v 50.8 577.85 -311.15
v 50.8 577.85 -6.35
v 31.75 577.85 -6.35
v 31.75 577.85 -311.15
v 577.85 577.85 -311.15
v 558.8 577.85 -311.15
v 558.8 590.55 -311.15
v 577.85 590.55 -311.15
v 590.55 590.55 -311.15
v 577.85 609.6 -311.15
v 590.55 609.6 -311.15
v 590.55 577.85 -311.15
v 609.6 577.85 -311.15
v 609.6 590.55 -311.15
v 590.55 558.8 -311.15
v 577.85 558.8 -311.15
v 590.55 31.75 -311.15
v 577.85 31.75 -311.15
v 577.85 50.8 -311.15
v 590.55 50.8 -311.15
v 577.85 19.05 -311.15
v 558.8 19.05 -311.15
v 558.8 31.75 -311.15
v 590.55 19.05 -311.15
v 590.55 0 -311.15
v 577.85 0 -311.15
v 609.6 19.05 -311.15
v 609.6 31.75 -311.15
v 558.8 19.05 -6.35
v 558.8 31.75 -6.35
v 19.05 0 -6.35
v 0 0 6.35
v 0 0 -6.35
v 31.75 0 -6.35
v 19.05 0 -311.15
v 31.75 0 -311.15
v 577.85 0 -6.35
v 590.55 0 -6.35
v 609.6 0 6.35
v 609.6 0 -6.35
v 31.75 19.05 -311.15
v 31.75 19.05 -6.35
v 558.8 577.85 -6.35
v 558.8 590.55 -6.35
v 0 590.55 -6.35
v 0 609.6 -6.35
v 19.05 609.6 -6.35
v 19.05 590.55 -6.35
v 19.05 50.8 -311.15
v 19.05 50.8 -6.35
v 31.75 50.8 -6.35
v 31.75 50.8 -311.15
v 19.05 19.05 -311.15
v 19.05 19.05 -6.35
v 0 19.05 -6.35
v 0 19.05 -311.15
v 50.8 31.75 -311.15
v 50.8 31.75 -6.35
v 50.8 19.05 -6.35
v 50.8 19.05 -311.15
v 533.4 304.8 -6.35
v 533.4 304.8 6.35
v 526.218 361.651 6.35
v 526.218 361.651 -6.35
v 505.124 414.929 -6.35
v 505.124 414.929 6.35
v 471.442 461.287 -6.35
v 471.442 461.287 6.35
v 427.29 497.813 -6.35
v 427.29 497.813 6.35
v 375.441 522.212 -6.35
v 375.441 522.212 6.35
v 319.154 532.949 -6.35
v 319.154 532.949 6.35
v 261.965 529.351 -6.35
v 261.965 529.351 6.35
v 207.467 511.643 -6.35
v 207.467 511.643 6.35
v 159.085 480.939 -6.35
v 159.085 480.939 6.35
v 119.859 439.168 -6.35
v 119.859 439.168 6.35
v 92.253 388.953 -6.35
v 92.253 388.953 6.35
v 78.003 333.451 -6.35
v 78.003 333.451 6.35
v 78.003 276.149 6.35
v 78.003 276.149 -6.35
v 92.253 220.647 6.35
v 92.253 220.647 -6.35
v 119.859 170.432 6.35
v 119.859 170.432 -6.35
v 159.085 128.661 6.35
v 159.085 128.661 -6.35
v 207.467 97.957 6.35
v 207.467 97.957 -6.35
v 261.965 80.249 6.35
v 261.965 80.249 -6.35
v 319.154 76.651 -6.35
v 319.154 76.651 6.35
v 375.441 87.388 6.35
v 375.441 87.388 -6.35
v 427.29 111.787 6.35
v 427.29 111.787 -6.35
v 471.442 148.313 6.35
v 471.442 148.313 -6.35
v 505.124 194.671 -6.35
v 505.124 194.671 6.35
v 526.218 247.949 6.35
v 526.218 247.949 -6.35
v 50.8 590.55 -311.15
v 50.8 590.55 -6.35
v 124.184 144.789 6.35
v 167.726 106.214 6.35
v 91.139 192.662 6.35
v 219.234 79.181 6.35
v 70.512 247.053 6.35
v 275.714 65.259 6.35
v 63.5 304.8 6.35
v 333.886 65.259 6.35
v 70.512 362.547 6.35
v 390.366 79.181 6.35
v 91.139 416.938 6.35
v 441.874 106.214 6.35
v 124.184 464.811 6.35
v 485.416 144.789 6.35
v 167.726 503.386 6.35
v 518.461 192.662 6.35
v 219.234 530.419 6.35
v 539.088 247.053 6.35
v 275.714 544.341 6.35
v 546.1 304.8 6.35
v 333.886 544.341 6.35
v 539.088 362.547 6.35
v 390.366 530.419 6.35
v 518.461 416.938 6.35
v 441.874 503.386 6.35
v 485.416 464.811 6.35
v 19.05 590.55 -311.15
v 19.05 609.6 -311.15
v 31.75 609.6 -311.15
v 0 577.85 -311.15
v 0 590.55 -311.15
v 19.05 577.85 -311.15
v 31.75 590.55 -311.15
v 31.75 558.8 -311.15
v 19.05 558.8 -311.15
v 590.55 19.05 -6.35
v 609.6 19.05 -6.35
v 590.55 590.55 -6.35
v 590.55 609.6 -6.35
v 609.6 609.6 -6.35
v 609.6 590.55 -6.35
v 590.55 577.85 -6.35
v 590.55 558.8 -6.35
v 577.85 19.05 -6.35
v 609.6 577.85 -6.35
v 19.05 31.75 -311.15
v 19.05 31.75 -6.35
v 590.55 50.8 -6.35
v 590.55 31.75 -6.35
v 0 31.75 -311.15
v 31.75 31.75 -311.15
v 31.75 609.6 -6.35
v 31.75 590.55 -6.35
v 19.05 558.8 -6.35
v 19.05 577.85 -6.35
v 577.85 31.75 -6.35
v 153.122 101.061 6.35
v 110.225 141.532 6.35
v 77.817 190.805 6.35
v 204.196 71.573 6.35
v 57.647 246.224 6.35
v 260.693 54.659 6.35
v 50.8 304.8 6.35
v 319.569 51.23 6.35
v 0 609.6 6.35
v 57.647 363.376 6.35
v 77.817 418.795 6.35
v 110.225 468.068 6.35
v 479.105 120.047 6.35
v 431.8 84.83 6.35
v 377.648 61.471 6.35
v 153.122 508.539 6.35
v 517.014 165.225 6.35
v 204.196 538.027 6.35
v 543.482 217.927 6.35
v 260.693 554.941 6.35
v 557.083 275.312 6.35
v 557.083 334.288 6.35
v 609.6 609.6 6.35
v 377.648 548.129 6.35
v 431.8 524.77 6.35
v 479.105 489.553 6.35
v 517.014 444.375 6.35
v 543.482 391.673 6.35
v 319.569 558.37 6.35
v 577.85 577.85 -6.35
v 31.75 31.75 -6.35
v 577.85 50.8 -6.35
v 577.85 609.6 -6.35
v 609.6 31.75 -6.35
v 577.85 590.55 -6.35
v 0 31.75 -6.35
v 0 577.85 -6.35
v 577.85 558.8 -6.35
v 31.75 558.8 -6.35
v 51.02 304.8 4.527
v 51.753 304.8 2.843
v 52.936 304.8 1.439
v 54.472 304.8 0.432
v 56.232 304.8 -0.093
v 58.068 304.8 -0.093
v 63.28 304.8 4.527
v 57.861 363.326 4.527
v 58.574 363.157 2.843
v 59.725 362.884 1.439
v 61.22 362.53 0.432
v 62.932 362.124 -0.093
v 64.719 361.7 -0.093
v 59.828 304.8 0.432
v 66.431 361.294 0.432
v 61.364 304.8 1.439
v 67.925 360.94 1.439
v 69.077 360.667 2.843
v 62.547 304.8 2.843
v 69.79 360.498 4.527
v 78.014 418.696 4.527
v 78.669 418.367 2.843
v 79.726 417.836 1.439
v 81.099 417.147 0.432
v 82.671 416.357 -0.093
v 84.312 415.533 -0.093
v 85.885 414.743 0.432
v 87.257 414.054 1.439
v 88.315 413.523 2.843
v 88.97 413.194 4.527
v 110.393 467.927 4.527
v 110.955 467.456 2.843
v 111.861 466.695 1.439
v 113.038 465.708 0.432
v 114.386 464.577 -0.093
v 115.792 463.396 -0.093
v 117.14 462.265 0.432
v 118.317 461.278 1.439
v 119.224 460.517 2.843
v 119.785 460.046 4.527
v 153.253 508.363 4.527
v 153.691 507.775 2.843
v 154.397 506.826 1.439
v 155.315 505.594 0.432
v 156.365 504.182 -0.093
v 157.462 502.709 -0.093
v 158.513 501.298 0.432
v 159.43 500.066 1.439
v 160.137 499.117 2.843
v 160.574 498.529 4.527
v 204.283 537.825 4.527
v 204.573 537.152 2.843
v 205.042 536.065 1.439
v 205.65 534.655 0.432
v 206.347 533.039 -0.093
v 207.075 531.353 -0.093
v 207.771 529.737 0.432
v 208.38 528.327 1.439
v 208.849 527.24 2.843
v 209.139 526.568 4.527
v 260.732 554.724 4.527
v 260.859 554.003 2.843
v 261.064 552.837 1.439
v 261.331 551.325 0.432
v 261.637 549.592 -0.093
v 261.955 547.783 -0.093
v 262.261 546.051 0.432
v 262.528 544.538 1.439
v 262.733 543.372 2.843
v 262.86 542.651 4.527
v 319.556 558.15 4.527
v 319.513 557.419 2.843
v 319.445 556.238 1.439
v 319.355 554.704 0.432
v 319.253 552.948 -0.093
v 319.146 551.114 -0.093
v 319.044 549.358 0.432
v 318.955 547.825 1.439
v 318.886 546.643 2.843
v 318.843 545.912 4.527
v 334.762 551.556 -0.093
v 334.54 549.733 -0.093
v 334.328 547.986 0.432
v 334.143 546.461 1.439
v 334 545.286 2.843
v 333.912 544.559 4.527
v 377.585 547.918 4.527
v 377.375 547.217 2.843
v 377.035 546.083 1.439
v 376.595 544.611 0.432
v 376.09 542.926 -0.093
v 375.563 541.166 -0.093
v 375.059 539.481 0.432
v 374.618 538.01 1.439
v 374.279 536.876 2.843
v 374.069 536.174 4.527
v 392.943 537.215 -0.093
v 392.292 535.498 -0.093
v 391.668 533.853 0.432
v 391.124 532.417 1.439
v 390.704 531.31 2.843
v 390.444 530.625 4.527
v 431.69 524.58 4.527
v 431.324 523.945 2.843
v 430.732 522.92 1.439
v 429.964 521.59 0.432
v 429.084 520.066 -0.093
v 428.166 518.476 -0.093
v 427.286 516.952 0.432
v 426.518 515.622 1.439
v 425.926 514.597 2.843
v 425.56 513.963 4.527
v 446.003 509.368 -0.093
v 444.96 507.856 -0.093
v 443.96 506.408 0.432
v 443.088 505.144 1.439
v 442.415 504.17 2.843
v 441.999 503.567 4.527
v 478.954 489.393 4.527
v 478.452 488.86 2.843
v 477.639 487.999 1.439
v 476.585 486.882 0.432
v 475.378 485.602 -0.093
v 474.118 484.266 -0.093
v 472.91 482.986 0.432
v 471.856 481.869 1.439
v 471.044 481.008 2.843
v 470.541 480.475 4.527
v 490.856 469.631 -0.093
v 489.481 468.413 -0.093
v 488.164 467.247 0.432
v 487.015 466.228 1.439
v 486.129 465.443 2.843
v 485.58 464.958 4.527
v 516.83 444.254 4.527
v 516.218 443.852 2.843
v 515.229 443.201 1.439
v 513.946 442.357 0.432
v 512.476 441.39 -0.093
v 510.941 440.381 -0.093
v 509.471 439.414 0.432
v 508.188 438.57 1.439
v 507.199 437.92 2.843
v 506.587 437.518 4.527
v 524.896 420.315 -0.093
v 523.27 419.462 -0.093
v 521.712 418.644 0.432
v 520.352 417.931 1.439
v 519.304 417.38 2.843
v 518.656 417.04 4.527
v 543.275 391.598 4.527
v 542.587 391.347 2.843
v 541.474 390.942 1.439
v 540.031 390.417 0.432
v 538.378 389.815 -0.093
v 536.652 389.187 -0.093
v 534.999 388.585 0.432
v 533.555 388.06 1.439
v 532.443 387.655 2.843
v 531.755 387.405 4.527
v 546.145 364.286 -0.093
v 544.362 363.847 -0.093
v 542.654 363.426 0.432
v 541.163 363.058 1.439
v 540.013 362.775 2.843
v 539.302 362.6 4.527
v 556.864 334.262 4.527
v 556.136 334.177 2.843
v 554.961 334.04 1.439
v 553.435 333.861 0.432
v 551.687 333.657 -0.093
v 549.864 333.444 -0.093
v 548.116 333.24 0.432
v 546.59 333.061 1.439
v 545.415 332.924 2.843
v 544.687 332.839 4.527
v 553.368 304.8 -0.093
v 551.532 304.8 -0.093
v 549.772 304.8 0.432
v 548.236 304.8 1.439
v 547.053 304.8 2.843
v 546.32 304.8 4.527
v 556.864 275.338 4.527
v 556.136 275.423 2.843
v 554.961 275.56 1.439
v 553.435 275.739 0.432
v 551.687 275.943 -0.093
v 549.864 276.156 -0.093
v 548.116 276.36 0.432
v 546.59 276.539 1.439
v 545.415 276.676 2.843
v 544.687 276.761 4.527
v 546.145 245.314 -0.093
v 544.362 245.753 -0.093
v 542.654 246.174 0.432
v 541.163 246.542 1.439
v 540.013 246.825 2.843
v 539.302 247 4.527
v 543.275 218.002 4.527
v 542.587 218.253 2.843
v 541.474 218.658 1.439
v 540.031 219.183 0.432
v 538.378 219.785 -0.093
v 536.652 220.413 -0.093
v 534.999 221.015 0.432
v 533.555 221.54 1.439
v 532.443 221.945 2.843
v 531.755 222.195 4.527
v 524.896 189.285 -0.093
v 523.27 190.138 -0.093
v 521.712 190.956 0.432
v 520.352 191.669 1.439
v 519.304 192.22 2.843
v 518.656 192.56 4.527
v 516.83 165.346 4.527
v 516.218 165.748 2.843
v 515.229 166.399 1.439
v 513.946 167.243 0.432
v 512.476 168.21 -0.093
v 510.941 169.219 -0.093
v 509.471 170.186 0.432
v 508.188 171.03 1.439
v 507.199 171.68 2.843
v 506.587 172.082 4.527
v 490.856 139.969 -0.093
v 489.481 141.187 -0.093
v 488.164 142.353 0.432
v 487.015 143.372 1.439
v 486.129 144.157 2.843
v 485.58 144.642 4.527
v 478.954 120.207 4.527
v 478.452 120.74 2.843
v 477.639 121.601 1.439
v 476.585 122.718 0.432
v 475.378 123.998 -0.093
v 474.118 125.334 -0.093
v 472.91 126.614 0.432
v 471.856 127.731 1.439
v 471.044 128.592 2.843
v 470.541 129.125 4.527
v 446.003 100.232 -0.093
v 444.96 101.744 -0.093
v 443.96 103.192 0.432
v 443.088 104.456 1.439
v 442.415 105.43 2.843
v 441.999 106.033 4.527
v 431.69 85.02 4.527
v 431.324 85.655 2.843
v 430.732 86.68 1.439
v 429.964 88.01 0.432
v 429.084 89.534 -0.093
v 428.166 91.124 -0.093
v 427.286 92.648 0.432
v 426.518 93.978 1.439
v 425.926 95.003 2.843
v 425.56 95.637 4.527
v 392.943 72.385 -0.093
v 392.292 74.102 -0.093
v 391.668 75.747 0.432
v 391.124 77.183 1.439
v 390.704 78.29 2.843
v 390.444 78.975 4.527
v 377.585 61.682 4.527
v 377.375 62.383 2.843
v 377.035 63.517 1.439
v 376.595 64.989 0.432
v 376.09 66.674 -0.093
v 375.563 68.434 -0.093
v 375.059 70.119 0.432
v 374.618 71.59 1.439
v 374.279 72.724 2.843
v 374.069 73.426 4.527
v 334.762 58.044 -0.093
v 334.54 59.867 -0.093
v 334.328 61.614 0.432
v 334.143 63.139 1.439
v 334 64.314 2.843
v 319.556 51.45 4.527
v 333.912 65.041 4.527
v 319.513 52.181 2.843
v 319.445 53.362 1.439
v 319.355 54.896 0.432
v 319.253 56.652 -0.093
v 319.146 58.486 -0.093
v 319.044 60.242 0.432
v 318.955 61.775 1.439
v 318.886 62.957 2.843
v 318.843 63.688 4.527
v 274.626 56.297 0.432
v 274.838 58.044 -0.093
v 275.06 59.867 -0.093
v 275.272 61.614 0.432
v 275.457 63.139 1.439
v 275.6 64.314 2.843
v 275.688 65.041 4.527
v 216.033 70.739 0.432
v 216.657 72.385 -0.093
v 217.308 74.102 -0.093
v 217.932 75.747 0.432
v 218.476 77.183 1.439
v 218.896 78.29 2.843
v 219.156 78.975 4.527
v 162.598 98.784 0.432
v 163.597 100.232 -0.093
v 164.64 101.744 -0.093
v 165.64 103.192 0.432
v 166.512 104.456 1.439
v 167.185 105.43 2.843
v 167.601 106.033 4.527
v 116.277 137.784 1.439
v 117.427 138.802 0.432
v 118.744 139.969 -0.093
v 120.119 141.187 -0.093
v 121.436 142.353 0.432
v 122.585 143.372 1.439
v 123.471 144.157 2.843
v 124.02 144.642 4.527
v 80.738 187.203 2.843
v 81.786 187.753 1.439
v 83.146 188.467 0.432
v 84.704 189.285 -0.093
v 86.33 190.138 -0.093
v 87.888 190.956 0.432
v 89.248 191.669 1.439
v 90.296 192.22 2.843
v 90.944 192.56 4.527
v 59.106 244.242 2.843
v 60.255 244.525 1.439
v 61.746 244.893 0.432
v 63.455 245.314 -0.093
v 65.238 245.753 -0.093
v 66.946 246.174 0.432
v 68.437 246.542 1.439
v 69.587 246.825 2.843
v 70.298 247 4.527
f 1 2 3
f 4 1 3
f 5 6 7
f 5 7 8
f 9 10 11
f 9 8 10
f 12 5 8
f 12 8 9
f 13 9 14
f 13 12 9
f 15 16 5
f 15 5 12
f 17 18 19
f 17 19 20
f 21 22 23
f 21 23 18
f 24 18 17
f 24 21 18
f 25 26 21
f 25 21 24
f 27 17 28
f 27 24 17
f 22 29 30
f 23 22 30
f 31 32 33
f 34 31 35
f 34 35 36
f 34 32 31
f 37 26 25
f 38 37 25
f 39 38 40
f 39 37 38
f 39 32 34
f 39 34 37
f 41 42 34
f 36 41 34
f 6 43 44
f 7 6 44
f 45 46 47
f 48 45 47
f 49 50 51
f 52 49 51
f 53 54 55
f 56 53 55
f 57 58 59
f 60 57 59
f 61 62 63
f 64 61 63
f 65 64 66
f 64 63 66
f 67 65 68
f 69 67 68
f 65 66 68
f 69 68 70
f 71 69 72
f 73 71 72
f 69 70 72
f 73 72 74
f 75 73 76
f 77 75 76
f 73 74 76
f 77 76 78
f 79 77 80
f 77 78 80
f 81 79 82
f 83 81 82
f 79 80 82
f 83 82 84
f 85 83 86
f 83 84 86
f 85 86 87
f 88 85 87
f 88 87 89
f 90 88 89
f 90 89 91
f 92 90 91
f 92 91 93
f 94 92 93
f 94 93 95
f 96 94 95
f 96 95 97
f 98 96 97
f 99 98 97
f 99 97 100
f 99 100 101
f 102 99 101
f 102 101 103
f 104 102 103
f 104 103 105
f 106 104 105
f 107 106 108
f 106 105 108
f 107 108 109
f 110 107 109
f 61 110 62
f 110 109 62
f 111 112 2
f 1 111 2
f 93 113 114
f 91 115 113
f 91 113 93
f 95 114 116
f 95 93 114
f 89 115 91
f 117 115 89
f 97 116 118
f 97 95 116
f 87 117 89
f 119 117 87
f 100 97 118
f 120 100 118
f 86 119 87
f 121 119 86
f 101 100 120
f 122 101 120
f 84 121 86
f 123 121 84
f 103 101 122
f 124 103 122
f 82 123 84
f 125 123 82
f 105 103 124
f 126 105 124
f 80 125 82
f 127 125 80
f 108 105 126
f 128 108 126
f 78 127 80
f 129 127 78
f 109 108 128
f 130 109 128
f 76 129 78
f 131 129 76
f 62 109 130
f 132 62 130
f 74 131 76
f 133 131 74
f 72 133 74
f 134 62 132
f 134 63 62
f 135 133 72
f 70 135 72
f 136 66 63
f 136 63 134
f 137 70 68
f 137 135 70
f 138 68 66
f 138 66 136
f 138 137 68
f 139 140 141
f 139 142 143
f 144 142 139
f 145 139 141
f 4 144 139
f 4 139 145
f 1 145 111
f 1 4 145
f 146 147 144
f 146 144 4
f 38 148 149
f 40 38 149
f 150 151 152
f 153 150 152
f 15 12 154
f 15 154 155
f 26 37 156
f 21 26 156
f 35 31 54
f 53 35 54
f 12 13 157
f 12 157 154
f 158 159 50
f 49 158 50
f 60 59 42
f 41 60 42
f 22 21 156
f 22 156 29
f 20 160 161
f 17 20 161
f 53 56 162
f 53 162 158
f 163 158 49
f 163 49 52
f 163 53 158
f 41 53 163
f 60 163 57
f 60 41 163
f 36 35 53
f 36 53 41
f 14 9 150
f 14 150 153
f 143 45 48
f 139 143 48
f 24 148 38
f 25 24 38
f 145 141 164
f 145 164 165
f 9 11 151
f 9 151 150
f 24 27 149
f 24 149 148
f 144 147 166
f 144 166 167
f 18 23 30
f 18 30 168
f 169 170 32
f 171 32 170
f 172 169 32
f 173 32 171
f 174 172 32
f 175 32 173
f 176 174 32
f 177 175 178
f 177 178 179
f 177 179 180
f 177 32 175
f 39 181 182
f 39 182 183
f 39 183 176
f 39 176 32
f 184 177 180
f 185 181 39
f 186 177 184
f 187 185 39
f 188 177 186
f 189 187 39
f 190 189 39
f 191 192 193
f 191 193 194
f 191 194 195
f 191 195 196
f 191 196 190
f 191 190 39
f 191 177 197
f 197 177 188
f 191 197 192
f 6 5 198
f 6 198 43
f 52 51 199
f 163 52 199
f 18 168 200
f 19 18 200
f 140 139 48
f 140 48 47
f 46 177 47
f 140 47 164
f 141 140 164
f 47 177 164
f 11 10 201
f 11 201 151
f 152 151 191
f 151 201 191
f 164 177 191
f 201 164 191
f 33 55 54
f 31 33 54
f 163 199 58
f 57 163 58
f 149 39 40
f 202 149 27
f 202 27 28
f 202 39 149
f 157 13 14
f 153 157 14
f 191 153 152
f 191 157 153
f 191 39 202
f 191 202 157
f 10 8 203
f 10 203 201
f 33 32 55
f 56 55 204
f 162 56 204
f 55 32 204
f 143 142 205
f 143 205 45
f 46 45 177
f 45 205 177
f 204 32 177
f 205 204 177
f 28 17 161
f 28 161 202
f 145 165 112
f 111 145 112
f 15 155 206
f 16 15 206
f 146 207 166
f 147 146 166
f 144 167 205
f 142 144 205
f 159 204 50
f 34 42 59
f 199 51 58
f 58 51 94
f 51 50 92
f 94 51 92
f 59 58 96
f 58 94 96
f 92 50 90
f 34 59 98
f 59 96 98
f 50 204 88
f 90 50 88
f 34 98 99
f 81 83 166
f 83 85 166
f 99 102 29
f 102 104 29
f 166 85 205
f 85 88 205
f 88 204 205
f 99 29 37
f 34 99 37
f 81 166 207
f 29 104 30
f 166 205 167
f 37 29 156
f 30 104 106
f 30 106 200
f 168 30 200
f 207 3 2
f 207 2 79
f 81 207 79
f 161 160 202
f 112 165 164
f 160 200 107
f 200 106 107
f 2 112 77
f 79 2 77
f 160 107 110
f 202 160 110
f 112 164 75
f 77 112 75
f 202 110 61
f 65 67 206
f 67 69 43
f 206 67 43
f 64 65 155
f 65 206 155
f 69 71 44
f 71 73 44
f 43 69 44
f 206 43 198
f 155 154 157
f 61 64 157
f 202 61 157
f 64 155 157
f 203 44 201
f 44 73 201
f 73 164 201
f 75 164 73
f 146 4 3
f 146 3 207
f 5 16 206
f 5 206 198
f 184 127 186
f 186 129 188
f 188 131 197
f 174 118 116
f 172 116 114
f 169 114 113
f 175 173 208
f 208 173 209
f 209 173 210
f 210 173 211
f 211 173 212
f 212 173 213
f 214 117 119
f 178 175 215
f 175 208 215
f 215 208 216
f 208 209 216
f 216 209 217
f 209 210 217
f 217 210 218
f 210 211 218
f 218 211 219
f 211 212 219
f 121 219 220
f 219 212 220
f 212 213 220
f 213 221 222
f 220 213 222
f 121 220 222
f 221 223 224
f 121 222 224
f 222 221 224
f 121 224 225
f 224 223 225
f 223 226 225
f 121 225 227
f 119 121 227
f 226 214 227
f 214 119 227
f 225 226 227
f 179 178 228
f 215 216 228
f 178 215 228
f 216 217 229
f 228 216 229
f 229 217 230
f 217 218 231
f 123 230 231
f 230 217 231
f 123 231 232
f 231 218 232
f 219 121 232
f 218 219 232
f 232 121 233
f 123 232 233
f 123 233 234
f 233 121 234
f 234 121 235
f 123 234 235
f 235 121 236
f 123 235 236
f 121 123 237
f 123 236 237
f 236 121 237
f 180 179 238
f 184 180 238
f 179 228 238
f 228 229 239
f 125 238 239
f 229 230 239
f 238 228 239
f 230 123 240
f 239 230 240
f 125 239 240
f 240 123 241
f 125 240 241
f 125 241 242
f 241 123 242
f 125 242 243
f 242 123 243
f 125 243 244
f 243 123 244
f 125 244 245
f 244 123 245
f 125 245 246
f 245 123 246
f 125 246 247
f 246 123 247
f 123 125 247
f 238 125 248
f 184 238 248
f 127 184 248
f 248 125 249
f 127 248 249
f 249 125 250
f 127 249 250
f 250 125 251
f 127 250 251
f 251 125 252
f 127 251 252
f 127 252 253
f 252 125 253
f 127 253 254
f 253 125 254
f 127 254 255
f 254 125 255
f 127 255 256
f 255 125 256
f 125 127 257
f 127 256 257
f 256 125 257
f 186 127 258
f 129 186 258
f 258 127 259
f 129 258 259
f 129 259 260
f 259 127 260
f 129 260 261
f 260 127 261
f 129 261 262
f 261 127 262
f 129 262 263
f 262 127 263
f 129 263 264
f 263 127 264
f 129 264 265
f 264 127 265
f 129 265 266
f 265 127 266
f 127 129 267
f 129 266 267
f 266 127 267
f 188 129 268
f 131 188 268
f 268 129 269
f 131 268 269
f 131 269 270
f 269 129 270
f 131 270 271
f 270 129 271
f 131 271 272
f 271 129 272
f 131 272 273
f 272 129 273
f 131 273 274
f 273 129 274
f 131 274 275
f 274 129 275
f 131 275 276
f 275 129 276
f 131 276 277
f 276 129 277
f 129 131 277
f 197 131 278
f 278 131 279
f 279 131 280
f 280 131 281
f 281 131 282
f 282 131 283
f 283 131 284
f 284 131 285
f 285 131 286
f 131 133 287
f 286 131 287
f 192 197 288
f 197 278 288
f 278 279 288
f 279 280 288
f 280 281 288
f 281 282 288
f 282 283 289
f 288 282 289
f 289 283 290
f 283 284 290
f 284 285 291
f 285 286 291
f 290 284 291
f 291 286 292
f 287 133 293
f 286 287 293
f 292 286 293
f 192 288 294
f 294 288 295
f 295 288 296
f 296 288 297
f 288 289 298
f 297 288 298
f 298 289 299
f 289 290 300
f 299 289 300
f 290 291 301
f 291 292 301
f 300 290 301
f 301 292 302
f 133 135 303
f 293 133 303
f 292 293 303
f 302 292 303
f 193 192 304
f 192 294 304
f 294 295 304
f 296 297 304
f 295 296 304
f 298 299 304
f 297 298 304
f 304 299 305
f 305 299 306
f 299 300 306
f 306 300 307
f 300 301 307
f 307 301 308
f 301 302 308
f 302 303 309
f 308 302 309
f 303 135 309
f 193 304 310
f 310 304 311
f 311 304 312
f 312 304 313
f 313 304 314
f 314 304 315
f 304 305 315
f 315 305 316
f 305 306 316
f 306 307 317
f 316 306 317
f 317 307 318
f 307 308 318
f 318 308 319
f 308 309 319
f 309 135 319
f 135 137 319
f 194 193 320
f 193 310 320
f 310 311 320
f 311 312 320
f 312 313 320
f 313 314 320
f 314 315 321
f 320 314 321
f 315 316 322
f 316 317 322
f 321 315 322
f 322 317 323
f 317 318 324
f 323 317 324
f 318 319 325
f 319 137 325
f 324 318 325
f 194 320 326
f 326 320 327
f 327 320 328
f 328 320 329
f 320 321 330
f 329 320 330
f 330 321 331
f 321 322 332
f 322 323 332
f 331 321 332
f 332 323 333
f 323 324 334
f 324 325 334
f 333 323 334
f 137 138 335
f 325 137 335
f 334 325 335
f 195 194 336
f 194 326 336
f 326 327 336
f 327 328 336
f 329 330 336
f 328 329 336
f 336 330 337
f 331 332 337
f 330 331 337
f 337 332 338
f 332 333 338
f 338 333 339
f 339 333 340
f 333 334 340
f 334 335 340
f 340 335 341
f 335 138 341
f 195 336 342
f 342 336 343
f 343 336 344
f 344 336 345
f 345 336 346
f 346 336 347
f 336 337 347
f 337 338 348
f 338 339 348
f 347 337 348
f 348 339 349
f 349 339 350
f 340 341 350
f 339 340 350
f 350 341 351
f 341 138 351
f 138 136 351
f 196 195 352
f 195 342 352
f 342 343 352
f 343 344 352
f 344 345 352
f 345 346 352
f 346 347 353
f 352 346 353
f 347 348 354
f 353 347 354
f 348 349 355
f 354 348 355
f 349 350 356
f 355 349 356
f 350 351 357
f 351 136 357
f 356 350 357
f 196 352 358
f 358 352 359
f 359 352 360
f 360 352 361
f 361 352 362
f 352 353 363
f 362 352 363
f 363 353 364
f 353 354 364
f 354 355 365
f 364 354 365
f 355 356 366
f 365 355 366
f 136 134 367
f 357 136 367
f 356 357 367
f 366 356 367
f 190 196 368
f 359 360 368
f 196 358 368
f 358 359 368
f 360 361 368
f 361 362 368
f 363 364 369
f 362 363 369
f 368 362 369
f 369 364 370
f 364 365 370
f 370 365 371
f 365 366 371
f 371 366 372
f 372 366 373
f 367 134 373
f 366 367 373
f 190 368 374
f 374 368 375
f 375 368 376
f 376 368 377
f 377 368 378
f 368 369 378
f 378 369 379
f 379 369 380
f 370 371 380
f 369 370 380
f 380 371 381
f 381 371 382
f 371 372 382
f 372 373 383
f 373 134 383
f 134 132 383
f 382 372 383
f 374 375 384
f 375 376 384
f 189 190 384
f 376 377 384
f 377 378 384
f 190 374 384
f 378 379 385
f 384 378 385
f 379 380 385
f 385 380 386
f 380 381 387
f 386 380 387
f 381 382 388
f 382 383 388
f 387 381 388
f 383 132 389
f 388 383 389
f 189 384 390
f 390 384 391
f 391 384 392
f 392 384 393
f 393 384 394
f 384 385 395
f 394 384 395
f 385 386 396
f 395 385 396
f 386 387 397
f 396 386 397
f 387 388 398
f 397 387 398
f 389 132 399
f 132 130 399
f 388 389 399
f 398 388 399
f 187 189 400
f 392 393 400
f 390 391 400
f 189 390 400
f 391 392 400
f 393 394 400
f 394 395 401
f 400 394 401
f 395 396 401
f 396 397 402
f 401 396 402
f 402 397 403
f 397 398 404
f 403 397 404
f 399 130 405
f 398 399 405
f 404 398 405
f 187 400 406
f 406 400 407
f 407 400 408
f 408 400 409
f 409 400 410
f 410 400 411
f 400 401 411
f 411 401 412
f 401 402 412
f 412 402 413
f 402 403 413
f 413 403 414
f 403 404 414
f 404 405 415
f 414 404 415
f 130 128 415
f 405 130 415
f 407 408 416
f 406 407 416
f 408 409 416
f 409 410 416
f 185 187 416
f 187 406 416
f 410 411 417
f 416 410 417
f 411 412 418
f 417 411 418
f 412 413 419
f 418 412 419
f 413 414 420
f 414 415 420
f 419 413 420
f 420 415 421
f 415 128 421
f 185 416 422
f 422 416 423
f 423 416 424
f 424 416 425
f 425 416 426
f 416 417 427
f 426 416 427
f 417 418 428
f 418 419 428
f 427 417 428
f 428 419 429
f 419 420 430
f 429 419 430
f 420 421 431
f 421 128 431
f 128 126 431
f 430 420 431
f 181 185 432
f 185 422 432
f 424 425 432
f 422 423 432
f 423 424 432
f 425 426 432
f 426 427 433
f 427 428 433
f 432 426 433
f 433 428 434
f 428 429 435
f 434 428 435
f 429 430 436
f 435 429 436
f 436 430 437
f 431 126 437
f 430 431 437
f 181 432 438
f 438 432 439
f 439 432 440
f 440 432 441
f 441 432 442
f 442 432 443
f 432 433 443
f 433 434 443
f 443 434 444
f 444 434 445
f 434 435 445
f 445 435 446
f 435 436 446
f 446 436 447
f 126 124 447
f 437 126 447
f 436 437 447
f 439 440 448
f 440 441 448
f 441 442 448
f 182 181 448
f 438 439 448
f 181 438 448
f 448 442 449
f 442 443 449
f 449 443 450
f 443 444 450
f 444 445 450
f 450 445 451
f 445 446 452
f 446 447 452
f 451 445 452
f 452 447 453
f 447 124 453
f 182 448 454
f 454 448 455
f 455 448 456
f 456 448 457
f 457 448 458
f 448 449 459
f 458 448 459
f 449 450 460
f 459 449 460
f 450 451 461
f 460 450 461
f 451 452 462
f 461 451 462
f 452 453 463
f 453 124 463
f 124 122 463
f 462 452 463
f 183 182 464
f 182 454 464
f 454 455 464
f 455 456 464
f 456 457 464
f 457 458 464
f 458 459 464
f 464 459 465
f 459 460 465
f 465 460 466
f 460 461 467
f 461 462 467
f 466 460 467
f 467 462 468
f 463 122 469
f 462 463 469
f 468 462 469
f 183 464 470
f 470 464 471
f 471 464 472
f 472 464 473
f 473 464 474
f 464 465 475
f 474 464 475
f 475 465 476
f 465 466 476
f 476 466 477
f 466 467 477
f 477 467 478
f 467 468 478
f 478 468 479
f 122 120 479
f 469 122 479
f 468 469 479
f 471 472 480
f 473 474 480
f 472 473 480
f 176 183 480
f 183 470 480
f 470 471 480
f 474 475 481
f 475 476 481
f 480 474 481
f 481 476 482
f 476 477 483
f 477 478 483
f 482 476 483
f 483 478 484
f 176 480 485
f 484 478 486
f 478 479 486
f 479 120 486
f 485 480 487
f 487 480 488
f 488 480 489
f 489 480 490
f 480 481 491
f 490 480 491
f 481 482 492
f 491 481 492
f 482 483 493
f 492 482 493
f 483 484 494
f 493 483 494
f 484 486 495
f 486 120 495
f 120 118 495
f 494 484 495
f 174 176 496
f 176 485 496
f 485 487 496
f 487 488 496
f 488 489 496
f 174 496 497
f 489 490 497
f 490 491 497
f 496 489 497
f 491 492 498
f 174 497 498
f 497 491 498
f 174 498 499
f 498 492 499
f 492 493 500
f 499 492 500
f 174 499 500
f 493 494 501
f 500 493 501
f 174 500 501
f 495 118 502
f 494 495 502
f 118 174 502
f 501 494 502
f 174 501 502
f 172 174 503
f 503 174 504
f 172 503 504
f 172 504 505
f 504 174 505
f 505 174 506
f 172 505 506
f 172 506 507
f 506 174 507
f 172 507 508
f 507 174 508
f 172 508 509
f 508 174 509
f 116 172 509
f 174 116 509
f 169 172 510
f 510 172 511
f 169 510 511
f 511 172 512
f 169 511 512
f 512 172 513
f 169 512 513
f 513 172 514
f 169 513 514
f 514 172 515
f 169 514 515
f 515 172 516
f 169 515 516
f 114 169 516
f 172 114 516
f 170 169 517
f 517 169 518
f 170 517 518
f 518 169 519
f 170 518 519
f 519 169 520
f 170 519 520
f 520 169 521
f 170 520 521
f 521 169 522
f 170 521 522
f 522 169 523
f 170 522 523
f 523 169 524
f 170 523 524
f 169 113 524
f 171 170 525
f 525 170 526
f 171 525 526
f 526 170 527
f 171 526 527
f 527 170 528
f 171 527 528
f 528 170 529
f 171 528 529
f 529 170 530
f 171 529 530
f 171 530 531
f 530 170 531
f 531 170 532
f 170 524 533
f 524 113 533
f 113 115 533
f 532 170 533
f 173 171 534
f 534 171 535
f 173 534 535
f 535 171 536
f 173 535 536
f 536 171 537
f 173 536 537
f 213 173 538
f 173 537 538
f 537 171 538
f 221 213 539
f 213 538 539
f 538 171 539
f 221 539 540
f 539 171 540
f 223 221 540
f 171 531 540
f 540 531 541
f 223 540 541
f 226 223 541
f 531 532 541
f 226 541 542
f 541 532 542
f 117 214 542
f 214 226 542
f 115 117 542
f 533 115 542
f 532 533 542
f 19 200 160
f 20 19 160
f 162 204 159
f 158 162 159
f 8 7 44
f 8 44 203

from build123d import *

# Parameters (mm, degrees)
F0_W     = 609.6
F0_H     = 609.6
F1_DEPTH = 6.35
F3_DEPTH = 304.8
F4_R     = 228.6
F8_DEPTH = 317.501


with BuildPart() as f1:
    # F0 (on Top) → F1 (new body, symmetric)
    with BuildSketch(Plane.XY):
        with Locations((304.8, 304.8)):
            Rectangle(F0_W, F0_H)
    extrude(amount=F1_DEPTH, both=True)

    # F2 (on face) → F3 (join)
    with BuildSketch(Plane(origin=(0, 0, -6.35), x_dir=(1, 0, 0), z_dir=(0, 0, -1))):
        Polygon((19.05, -19.05), (0, -19.05), (0, -31.75), (19.05, -31.75), (19.05, -50.8), (31.75, -50.8), (31.75, -31.75), (50.8, -31.75), (50.8, -19.05), (31.75, -19.05), (31.75, 0), (19.05, 0), align=None)
        Polygon((590.55, -50.8), (590.55, -31.75), (609.6, -31.75), (609.6, -19.05), (590.55, -19.05), (590.55, 0), (577.85, 0), (577.85, -19.05), (558.8, -19.05), (558.8, -31.75), (577.85, -31.75), (577.85, -50.8), align=None)
        Polygon((19.05, -590.55), (19.05, -609.6), (31.75, -609.6), (31.75, -590.55), (50.8, -590.55), (50.8, -577.85), (31.75, -577.85), (31.75, -558.8), (19.05, -558.8), (19.05, -577.85), (0, -577.85), (0, -590.55), align=None)
        Polygon((577.85, -609.6), (590.55, -609.6), (590.55, -590.55), (609.6, -590.55), (609.6, -577.85), (590.55, -577.85), (590.55, -558.8), (577.85, -558.8), (577.85, -577.85), (558.8, -577.85), (558.8, -590.55), (577.85, -590.55), align=None)
    extrude(amount=F3_DEPTH)

    # F6 (on offset) → F7 (revolve, cut)
    with BuildSketch(Plane.XZ.offset(-304.8)):
        with BuildLine():
            Line((63.5, 6.35), (50.8, 6.35))
            ThreePointArc((50.8, 6.35), (57.15, -0.1598234894), (63.5, 6.35))
        make_face()
    revolve(axis=Axis((304.8, 304.8, 0), (0, 0, -1)), mode=Mode.SUBTRACT)

    # F4 (on face) → F8 (cut, through all)
    with BuildSketch(Plane.XY.offset(6.35)):
        with Locations((304.8, 304.8)):
            Circle(F4_R)
    extrude(amount=-F8_DEPTH, mode=Mode.SUBTRACT)


solid = f1.part
